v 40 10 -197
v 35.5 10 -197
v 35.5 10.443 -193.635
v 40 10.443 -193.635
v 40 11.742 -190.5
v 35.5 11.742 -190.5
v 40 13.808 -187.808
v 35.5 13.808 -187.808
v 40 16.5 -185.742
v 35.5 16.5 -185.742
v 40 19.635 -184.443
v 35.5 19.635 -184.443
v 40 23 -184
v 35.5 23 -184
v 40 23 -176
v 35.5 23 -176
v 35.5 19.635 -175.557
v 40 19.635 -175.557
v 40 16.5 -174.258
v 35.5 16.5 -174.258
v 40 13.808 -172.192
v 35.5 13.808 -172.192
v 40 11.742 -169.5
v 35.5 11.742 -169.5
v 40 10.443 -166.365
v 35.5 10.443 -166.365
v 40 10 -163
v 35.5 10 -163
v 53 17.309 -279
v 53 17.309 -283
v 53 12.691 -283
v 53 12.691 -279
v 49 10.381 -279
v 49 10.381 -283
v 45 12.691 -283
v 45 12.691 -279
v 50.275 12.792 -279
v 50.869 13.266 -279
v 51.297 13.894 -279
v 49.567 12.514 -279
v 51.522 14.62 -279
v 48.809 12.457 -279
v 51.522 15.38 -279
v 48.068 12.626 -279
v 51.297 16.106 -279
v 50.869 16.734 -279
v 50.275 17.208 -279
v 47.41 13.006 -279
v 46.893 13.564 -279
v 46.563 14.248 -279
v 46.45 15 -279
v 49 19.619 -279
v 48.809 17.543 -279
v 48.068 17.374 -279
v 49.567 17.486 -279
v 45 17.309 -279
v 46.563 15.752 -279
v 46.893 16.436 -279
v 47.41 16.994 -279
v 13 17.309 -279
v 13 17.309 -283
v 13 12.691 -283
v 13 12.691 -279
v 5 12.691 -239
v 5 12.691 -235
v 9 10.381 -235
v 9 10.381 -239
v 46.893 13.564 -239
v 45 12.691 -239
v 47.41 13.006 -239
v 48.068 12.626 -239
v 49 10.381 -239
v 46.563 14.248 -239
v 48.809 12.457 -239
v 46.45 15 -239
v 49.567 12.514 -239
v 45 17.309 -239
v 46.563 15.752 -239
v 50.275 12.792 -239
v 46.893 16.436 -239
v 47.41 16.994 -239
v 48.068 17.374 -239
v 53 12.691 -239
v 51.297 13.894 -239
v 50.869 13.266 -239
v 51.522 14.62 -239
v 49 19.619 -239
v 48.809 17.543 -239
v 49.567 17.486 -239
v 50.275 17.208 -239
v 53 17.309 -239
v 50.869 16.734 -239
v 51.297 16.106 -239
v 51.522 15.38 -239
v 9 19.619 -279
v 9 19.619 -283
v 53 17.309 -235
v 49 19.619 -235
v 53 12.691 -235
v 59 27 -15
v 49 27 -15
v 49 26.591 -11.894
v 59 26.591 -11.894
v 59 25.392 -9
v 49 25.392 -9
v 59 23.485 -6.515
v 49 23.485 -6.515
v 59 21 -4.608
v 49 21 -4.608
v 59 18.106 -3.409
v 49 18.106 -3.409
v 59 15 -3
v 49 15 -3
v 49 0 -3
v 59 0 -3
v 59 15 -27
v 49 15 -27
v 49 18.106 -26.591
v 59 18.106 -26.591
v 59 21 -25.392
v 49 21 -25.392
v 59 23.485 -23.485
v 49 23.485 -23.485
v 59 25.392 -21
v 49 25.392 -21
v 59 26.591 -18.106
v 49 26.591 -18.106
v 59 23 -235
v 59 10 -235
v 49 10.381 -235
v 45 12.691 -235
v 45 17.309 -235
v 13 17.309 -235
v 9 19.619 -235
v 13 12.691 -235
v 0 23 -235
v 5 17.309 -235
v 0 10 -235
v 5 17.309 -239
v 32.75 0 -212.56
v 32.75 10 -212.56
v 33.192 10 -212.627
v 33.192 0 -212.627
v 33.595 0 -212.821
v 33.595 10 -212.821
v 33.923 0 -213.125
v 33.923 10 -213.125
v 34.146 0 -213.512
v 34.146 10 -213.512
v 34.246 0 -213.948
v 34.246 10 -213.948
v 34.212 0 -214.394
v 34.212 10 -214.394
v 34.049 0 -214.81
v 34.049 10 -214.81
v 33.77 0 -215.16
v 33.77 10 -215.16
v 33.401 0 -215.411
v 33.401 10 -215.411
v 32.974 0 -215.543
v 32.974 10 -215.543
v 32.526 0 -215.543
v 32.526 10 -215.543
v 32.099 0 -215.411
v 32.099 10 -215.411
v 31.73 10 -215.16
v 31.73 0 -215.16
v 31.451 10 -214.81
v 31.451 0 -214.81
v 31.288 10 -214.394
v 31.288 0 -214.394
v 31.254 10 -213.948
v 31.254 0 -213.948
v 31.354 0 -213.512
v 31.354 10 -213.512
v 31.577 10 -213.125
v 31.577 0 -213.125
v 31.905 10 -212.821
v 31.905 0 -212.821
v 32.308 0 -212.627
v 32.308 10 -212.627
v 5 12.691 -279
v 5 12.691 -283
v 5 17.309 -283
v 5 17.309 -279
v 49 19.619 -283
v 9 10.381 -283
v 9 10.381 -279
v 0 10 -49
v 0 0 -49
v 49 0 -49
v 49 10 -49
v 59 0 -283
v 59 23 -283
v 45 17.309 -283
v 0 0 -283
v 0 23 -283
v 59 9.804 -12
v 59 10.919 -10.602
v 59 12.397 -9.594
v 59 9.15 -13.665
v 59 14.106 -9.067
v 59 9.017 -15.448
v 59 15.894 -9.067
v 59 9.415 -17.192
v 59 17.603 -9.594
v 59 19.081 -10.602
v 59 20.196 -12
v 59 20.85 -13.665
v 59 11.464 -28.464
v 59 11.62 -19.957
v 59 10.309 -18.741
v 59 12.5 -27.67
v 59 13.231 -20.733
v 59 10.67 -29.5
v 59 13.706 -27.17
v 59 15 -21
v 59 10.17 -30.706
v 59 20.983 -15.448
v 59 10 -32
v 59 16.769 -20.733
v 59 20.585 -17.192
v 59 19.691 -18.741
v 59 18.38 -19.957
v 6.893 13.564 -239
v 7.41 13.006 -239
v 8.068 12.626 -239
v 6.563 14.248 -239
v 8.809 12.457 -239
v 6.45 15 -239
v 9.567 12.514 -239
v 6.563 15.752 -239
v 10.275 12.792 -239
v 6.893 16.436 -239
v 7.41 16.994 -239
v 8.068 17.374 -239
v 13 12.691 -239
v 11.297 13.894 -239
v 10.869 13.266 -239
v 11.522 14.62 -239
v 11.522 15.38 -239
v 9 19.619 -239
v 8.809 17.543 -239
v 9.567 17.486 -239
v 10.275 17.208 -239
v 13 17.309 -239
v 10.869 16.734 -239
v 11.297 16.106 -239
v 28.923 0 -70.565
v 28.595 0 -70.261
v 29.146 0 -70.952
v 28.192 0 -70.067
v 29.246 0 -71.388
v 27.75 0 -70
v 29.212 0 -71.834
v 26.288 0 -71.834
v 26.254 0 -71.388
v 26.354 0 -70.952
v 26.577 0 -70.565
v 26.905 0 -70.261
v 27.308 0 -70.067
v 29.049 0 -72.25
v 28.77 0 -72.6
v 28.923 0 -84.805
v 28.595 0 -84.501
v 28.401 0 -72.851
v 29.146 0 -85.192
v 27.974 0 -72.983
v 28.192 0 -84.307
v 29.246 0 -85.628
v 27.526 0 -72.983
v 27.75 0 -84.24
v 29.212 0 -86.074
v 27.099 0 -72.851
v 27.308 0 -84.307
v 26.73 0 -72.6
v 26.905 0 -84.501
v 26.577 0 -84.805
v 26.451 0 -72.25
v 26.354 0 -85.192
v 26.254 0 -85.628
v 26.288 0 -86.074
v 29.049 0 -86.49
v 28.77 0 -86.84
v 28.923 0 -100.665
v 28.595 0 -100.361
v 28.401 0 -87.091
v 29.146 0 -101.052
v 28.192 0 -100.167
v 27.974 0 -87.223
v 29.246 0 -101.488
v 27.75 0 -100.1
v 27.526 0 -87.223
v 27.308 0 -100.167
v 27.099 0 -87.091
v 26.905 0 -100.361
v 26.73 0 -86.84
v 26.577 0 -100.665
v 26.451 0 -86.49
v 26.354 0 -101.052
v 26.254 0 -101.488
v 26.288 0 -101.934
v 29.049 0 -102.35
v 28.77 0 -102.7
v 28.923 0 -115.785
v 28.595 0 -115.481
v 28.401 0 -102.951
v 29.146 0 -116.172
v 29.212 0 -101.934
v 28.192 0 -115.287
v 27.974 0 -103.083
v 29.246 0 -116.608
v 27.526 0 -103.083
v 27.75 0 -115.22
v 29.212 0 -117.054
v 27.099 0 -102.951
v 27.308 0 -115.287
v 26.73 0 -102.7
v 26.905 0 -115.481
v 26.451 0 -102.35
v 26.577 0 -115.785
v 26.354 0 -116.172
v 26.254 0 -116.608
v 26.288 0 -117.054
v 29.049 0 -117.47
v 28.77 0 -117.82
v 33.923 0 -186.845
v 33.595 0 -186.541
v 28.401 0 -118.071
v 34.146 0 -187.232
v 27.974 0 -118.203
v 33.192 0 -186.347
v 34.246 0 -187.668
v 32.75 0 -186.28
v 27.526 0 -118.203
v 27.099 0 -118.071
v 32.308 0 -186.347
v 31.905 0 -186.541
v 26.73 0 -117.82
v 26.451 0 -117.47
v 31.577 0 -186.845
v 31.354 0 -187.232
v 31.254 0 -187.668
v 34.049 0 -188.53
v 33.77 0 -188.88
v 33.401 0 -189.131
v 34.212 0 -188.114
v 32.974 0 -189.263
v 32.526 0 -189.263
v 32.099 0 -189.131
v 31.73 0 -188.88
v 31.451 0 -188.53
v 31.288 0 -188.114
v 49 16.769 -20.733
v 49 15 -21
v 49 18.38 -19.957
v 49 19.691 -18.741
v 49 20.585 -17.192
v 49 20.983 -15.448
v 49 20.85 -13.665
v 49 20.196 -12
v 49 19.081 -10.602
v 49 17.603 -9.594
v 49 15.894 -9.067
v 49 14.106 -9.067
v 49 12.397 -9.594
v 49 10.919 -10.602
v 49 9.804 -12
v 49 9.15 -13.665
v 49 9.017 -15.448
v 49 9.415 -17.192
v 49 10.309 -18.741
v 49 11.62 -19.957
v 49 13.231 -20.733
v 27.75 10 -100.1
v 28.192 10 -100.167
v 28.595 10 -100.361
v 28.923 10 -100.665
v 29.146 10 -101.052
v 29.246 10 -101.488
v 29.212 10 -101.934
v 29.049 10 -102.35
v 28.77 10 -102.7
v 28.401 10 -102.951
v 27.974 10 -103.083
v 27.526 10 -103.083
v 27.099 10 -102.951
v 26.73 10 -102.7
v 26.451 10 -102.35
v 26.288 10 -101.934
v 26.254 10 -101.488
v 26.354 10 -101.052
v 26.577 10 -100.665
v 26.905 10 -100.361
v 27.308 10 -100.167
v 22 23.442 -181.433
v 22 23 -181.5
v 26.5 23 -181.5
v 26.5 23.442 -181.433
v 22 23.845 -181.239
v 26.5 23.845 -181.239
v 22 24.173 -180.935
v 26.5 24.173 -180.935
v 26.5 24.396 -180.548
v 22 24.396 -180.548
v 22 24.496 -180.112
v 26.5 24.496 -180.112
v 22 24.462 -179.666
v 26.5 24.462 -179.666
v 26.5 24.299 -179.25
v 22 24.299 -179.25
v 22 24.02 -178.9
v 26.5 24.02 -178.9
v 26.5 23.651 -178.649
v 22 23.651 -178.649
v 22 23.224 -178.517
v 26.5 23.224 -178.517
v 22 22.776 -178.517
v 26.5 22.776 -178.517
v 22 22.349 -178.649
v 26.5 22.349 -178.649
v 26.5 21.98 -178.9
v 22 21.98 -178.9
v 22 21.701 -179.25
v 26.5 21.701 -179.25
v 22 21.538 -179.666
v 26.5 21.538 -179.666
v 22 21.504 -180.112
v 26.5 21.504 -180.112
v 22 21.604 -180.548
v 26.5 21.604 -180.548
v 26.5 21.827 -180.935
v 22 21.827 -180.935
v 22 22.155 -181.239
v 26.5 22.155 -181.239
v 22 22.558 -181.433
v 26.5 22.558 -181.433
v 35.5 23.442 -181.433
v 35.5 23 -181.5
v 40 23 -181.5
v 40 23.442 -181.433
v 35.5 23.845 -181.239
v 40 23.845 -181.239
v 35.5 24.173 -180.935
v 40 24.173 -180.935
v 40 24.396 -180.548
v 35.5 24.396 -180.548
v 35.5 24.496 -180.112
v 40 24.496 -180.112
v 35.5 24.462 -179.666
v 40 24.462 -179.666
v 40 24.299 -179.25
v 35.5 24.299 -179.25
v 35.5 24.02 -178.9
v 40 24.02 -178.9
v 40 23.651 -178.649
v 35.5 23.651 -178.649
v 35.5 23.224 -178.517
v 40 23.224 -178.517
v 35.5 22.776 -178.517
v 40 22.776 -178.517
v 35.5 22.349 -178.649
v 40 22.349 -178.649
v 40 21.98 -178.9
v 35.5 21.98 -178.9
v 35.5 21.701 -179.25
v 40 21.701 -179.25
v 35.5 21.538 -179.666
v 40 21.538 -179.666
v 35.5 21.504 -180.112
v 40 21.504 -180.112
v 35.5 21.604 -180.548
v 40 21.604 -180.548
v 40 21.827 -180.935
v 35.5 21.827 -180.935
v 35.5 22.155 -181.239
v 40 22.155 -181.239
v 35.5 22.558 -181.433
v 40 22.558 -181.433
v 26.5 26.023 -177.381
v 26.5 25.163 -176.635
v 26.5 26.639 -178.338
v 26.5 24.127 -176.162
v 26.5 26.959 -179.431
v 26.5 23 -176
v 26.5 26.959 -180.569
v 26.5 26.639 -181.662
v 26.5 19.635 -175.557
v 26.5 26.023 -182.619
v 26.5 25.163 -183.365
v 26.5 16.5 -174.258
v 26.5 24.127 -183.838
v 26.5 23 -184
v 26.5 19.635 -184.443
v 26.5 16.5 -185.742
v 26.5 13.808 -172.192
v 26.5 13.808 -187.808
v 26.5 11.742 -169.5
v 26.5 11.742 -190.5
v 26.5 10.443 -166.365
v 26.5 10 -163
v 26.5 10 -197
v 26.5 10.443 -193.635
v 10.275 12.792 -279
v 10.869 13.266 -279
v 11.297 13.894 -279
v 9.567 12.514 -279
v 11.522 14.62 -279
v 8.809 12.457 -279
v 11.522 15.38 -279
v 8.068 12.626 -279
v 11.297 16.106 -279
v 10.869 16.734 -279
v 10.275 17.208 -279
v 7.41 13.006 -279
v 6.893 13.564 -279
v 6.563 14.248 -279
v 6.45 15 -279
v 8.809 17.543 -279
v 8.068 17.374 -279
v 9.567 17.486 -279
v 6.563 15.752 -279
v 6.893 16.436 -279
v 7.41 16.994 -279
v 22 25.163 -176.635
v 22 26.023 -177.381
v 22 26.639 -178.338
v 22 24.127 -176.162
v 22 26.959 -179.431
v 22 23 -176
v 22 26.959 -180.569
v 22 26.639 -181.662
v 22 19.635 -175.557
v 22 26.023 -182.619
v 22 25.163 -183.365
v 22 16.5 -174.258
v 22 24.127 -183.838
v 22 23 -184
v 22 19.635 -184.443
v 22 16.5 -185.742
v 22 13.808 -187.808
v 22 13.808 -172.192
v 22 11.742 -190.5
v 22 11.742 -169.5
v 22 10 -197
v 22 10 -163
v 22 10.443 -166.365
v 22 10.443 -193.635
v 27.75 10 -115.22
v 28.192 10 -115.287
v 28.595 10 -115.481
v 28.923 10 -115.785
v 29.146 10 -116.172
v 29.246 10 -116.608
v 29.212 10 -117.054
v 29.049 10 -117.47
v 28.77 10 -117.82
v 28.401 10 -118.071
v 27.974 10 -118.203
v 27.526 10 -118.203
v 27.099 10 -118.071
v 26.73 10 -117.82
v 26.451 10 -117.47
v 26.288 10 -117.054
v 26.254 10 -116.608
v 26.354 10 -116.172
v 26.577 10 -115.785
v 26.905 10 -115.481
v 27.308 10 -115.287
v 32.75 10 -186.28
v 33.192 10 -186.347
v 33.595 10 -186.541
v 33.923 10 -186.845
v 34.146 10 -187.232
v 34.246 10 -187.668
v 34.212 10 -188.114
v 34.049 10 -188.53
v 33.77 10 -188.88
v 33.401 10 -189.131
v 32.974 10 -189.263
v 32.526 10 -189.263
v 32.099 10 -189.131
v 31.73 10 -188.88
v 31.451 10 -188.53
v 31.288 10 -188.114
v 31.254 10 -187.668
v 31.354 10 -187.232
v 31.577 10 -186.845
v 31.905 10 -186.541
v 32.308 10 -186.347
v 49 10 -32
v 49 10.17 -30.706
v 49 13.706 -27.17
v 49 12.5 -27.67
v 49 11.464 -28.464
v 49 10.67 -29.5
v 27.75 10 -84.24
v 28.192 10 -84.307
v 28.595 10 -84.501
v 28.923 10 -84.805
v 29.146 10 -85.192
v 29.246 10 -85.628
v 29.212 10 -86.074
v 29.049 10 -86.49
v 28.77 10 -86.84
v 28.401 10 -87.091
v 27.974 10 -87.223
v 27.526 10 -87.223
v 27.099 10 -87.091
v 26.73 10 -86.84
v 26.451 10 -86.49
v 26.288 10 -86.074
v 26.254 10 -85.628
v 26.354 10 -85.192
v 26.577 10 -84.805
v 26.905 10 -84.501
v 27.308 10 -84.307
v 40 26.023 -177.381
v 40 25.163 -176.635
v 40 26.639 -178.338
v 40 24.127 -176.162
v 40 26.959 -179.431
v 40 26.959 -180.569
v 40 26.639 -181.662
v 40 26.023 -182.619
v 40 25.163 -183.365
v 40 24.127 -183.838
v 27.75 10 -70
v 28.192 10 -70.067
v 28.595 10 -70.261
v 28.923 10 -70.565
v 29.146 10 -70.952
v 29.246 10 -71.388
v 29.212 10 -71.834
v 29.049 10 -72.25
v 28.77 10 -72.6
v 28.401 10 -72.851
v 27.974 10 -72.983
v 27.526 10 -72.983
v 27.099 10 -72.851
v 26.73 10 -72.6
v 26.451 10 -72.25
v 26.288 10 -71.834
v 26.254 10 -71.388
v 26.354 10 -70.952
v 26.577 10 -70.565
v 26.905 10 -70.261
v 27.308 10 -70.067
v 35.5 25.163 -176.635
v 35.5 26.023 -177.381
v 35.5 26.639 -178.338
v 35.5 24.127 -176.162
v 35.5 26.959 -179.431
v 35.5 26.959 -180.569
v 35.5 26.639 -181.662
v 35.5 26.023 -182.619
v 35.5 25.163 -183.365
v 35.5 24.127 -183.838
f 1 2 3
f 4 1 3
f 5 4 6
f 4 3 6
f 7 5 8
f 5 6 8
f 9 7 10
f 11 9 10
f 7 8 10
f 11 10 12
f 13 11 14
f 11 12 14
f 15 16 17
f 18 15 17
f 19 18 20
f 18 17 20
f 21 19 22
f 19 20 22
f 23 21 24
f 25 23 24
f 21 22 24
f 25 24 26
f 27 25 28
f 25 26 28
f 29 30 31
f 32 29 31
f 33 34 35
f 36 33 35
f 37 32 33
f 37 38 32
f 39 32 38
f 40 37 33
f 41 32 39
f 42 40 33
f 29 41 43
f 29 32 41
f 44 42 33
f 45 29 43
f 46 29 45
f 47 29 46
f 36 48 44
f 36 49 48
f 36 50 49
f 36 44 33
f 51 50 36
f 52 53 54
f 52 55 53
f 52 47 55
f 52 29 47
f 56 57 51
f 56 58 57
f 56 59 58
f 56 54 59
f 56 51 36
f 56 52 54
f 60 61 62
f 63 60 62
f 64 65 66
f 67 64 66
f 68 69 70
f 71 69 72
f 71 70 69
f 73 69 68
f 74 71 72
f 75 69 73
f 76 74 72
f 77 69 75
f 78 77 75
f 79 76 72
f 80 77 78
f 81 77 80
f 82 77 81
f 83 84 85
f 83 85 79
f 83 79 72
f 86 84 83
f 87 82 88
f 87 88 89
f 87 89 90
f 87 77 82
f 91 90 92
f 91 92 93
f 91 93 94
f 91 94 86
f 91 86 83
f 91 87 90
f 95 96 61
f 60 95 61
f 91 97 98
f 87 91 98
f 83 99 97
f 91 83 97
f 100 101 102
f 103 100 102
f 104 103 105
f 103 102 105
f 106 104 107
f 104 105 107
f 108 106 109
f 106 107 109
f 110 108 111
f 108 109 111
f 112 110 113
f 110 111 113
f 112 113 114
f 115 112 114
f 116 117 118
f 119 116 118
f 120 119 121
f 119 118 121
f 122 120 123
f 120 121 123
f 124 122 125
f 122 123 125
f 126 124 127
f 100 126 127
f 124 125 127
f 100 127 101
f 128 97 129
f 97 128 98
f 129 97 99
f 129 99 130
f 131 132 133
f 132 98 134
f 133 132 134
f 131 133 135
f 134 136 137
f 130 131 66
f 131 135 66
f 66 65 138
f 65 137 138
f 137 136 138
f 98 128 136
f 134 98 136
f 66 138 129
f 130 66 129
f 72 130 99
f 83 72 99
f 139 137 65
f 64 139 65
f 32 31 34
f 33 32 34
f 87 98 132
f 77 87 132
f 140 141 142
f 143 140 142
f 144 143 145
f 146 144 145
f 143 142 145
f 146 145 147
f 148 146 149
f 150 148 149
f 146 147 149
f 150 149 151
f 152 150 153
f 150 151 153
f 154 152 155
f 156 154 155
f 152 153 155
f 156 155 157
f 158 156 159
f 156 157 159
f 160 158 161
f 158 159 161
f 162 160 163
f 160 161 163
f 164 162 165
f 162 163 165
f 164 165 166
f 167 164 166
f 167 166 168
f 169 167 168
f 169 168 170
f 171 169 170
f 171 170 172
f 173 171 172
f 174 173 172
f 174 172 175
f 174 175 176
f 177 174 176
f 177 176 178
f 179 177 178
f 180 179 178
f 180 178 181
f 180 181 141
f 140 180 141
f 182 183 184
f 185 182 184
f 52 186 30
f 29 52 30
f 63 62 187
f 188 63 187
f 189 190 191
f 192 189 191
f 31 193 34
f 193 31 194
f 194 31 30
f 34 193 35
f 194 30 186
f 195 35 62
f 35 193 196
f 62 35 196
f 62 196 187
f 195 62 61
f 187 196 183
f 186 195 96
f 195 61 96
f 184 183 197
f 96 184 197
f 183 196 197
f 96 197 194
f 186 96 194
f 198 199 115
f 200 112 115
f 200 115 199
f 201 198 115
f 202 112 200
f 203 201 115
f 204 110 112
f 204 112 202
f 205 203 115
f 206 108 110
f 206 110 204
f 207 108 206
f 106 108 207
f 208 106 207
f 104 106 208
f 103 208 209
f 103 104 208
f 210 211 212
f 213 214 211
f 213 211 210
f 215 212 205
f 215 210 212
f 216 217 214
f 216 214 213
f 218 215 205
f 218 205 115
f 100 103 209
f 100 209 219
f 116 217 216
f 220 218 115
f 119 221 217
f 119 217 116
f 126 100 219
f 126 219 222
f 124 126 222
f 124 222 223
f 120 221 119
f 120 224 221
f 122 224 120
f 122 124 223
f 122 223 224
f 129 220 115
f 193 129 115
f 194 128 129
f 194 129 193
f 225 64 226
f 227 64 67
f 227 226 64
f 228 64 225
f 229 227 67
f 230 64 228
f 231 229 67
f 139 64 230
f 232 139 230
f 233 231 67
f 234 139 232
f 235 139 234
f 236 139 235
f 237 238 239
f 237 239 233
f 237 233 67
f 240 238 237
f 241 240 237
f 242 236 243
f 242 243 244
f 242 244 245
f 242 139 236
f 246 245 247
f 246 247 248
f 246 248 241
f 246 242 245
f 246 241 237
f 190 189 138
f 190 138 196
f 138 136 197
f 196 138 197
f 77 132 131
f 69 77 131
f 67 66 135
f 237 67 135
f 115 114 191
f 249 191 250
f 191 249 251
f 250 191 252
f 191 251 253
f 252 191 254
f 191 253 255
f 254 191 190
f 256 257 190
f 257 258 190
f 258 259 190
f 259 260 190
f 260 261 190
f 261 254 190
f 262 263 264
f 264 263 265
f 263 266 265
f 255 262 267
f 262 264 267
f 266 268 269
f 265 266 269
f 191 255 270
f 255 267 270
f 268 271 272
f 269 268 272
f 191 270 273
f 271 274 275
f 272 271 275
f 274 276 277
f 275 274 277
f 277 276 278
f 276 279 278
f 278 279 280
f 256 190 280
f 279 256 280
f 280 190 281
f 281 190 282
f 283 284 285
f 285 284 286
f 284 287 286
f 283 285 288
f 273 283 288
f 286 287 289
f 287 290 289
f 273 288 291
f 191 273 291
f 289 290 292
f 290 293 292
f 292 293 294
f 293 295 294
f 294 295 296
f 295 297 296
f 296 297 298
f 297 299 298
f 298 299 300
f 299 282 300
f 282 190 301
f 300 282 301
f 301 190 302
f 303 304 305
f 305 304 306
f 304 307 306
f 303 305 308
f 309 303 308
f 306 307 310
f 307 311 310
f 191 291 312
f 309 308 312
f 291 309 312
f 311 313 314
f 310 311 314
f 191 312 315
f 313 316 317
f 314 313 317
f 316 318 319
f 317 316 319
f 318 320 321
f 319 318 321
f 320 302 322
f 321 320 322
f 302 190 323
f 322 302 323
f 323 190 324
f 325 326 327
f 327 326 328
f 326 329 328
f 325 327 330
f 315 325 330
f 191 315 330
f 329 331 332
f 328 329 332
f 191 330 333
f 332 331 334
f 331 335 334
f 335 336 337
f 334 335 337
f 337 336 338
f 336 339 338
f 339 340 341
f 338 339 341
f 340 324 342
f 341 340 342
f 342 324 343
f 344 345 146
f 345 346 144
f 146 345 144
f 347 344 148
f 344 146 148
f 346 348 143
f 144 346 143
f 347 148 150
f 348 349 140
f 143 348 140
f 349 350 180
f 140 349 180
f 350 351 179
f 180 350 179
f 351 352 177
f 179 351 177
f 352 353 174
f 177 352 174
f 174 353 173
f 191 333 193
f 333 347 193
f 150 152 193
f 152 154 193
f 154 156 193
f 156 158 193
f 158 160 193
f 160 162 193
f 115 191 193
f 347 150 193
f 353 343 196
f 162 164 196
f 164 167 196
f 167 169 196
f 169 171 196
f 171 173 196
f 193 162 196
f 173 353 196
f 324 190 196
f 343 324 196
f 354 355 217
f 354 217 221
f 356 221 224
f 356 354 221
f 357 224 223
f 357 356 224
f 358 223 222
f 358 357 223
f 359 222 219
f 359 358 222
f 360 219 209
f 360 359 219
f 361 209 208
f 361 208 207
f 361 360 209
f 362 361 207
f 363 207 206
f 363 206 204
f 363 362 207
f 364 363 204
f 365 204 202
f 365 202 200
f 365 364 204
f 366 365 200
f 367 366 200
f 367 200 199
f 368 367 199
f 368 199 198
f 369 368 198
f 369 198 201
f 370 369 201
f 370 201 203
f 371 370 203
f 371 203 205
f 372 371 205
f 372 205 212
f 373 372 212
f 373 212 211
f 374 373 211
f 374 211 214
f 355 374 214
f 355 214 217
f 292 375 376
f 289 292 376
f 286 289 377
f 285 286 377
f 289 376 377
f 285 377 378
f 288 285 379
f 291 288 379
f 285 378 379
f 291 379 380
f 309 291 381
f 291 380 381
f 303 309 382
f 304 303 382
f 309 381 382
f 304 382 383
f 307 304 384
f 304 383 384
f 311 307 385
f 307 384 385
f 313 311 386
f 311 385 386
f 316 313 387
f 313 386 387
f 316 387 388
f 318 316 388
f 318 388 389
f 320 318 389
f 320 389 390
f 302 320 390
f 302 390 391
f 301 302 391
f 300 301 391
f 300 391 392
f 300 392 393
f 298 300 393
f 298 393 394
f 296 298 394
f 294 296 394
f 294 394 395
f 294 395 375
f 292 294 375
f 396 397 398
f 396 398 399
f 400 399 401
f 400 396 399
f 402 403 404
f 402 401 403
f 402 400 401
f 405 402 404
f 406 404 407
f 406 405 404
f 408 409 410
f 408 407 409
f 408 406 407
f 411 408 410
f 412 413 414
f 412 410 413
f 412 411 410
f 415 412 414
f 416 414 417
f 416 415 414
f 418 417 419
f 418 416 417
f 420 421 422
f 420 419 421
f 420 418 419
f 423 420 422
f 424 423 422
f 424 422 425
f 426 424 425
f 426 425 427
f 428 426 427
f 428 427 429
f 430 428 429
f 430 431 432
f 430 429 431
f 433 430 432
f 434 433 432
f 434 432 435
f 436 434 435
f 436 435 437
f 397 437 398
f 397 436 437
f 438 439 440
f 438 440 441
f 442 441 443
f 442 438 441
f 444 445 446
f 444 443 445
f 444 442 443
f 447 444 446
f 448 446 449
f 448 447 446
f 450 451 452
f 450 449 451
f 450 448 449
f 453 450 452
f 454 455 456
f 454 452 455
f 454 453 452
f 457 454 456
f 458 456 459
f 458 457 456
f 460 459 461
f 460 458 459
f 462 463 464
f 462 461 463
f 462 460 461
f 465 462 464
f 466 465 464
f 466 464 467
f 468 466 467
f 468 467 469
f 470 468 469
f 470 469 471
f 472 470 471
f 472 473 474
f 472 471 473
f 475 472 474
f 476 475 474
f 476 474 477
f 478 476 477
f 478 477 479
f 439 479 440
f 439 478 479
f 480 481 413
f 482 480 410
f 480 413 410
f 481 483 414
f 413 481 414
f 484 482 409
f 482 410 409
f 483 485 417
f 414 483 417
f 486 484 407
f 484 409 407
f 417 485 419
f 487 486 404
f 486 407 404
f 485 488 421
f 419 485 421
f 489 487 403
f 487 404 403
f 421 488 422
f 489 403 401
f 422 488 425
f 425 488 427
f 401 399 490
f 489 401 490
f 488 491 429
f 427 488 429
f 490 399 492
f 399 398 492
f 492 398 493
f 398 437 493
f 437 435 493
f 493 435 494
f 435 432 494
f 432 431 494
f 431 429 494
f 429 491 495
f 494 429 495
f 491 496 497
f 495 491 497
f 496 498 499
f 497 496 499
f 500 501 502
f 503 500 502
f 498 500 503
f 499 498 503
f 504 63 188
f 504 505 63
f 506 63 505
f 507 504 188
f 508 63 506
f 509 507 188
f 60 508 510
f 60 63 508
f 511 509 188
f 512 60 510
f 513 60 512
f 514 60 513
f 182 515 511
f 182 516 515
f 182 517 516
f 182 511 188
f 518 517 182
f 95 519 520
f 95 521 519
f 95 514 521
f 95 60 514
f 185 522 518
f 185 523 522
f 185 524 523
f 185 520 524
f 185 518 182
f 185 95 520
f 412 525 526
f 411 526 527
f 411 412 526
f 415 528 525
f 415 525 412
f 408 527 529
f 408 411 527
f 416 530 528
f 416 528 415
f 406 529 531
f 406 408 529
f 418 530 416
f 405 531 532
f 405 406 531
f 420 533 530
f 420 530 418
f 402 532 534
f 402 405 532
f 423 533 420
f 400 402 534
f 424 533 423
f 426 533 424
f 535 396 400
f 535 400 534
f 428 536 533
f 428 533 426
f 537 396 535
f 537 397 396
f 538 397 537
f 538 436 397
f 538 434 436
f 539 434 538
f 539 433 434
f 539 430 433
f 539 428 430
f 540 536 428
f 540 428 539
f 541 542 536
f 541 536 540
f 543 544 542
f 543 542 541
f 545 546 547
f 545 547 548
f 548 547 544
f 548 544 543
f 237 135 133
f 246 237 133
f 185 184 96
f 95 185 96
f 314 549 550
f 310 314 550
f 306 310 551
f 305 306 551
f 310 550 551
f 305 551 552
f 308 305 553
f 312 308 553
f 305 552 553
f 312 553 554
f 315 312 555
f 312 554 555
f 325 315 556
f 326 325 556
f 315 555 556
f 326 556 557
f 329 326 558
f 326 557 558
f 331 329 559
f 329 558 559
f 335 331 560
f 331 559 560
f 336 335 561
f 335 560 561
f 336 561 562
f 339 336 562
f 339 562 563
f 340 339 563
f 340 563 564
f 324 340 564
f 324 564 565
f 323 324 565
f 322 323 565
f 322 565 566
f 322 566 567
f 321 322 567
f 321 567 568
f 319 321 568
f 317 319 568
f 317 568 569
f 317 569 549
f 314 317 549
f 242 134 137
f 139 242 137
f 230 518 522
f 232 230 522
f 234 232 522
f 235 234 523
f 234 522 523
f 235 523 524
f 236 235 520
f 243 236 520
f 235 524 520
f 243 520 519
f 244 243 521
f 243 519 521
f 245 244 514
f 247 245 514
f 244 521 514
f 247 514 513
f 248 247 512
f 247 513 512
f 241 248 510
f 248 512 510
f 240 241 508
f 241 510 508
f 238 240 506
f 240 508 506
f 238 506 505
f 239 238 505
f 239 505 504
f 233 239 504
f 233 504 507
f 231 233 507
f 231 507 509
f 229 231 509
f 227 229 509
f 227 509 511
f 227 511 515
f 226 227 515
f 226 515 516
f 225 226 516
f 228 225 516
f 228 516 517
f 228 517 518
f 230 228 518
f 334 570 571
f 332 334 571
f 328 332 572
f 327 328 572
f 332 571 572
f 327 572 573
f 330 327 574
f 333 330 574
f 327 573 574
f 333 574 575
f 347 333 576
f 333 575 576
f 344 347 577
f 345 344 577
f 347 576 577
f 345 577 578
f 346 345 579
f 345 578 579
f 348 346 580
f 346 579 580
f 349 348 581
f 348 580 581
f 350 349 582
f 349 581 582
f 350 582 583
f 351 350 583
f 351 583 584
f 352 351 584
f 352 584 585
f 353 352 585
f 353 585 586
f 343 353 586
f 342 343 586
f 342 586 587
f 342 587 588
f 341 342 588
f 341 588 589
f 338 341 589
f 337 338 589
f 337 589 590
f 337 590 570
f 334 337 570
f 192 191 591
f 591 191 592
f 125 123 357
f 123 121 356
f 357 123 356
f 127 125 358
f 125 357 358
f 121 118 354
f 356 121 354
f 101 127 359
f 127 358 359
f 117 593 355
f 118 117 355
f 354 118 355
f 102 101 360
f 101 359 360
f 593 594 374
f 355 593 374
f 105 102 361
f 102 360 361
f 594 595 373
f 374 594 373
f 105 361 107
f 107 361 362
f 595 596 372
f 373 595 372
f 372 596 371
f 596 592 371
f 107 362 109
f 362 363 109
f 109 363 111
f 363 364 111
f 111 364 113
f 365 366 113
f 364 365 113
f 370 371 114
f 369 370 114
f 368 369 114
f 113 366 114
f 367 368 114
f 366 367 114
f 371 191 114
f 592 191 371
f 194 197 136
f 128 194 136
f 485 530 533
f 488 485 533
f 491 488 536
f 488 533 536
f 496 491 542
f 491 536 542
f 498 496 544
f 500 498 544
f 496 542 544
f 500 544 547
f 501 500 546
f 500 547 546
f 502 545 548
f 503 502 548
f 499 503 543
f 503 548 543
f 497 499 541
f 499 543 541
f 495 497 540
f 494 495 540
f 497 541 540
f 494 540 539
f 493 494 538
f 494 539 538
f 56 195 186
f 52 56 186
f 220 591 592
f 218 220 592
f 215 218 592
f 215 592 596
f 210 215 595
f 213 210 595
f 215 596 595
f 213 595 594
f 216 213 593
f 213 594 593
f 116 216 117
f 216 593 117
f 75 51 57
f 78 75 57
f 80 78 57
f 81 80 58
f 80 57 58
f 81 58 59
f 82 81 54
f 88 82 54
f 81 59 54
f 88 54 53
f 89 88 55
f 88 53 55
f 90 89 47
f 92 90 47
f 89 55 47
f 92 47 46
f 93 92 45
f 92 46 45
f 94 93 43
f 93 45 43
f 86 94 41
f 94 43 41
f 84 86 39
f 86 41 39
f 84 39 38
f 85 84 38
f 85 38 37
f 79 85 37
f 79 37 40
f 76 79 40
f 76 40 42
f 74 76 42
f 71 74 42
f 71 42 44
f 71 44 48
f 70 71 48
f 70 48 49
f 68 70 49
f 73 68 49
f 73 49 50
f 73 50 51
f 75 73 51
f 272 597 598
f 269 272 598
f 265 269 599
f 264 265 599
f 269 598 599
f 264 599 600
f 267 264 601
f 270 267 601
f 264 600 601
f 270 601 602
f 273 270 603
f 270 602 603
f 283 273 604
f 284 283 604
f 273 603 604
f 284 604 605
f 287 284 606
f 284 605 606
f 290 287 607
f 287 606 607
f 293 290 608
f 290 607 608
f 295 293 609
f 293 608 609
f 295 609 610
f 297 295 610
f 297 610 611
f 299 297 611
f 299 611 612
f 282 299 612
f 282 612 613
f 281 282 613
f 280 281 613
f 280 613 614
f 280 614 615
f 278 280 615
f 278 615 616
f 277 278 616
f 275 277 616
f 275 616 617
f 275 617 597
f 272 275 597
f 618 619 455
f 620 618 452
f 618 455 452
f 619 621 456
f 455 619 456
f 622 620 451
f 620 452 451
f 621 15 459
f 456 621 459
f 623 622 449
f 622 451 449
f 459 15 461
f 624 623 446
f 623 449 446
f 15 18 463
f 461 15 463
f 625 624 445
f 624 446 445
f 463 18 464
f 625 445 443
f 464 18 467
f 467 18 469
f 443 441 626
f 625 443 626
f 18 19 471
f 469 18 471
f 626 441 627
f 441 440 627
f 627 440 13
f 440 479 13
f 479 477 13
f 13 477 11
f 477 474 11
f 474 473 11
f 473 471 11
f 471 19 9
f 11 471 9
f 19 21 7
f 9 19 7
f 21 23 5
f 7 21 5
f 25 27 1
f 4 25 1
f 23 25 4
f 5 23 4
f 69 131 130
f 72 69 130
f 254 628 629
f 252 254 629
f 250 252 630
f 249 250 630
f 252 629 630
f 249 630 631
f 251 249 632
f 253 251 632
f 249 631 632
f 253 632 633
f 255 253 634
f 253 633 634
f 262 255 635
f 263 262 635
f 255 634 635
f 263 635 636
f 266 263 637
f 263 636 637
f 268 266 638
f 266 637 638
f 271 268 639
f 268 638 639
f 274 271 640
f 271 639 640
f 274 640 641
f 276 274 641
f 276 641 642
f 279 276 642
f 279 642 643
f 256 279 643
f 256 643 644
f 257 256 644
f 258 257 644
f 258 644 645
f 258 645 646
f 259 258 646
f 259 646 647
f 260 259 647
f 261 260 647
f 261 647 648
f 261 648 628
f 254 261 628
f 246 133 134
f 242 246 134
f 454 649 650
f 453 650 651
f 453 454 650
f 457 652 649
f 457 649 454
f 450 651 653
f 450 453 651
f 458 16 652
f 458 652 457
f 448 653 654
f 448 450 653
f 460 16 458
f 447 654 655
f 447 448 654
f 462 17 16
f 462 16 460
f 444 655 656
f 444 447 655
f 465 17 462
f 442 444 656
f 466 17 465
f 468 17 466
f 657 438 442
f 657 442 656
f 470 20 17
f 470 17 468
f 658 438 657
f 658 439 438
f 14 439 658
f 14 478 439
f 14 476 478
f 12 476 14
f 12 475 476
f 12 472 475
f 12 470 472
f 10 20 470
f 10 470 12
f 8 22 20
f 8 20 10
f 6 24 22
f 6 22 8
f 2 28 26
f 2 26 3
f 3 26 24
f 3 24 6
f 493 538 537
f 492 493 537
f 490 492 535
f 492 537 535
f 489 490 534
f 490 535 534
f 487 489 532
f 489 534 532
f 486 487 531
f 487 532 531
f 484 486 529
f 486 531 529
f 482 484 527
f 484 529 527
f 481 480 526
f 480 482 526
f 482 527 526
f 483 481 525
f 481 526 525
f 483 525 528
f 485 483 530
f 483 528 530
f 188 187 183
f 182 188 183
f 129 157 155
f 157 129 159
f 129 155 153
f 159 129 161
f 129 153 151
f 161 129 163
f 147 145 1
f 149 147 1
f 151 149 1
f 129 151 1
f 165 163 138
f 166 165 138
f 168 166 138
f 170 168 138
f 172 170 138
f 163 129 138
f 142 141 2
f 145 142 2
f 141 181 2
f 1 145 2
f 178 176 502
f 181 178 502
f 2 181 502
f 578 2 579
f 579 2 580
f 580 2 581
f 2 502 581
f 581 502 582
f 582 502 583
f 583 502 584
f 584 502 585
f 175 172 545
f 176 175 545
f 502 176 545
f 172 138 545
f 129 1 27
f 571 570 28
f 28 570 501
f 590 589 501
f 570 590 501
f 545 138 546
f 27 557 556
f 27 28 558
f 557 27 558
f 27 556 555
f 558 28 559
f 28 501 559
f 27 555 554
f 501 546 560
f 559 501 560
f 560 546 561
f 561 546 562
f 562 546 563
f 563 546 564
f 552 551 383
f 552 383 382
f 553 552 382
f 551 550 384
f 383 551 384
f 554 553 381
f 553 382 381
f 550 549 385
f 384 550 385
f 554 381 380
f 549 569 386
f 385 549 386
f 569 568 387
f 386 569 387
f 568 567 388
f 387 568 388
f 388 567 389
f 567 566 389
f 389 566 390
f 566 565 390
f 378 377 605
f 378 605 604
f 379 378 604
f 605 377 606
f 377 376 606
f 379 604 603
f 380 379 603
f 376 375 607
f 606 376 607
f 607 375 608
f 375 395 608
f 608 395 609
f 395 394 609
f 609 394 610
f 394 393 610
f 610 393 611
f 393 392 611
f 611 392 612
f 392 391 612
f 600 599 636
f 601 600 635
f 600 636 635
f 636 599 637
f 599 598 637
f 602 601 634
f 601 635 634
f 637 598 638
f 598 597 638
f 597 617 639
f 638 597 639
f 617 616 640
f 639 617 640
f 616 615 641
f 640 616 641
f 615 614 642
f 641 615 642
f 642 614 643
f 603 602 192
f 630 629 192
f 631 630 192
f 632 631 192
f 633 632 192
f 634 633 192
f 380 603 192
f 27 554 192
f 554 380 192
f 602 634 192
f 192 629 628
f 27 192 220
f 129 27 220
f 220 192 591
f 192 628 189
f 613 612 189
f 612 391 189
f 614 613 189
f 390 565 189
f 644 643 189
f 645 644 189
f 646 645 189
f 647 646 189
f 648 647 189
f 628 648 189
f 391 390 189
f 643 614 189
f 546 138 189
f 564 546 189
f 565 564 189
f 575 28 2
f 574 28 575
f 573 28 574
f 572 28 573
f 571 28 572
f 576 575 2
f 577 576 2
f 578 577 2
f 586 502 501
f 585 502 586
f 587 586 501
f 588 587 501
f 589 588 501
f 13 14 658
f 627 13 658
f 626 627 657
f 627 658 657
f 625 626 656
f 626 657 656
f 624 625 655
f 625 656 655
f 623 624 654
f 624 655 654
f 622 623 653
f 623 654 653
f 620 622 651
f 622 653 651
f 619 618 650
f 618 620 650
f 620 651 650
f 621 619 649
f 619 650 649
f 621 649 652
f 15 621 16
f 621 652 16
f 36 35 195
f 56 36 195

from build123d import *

# Parameters (mm, degrees)
SKETCH1_R           = 6
SKETCH1_R_2         = 1.5
BOSS_EXTRUDE1_DEPTH = 59
SKETCH2_W           = 49
SKETCH2_H           = 46
CUT_EXTRUDE1_DEPTH  = 291.342900723
SKETCH3_W           = 9
SKETCH3_H           = 50
SKETCH3_W_2         = 22
SKETCH3_W_3         = 19
CUT_EXTRUDE2_DEPTH  = 290.584184651
CUT_EXTRUDE3_DEPTH  = 4
SKETCH7_R           = 2.55
CUT_EXTRUDE4_DEPTH  = 82
CUT_EXTRUDE5_DEPTH  = 4
SKETCH9_R           = 1.5
CUT_EXTRUDE6_DEPTH  = 290.584184651


with BuildPart() as part:
    # Sketch1 → Boss-Extrude1 (new body)
    with BuildSketch(Plane(origin=(0, 0, 0), x_dir=(0, 0, -1), z_dir=(1, 0, 0))):
        with BuildLine():
            Line((3, 15), (3, 0))
            Line((3, 0), (283, 0))
            Line((283, 0), (283, 23))
            Line((283, 23), (235, 23))
            Line((235, 23), (235, 10))
            Line((235, 10), (197, 10))
            ThreePointArc((197, 10), (187.807611845, 13.807611845), (184, 23))
            ThreePointArc((184, 23), (180, 27), (176, 23))
            ThreePointArc((176, 23), (172.192388155, 13.807611845), (163, 10))
            Line((163, 10), (32, 10))
            ThreePointArc((32, 10), (28.464466094, 11.464466094), (27, 15))
            ThreePointArc((27, 15), (23.485281374, 23.485281374), (15, 27))
            ThreePointArc((15, 27), (6.514718626, 23.485281374), (3, 15))
        make_face()
        with Locations((15, 15)):
            Circle(SKETCH1_R, mode=Mode.SUBTRACT)
        with Locations((180, 23)):
            Circle(SKETCH1_R_2, mode=Mode.SUBTRACT)
    extrude(amount=BOSS_EXTRUDE1_DEPTH)

    # Sketch2 → Cut-Extrude1 (cut, through all)
    with BuildSketch(Plane.XZ):
        with Locations((24.5, -26)):
            Rectangle(SKETCH2_W, SKETCH2_H)
    extrude(amount=-CUT_EXTRUDE1_DEPTH, mode=Mode.SUBTRACT)

    # Sketch3 → Cut-Extrude2 (cut, through all)
    with BuildSketch(Plane(origin=(0, 10, 0), x_dir=(1, 0, 0), z_dir=(0, 1, 0))):
        with Locations((31, 172)):
            Rectangle(SKETCH3_W, SKETCH3_H)
        with Locations((11, 172)):
            Rectangle(SKETCH3_W_2, SKETCH3_H)
        with Locations((49.5, 172)):
            Rectangle(SKETCH3_W_3, SKETCH3_H)
    extrude(amount=CUT_EXTRUDE2_DEPTH, mode=Mode.SUBTRACT)

    # Sketch6 → Cut-Extrude3 (cut)
    with BuildSketch(Plane(origin=(0, 0, -283), x_dir=(-1, 0, 0), z_dir=(0, 0, -1))):
        Polygon((-49, 10.381197846), (-45, 12.690598923), (-45, 17.309401077), (-49, 19.618802154), (-53, 17.309401077), (-53, 12.690598923), align=None)
        Polygon((-9, 10.381197846), (-5, 12.690598923), (-5, 17.309401077), (-9, 19.618802154), (-13, 17.309401077), (-13, 12.690598923), align=None)
    extrude(amount=-CUT_EXTRUDE3_DEPTH, mode=Mode.SUBTRACT)

    # Sketch7 → Cut-Extrude4 (cut)
    with BuildSketch(Plane(origin=(0, 0, -279), x_dir=(-1, 0, 0), z_dir=(0, 0, -1))):
        with Locations((-49, 15)):
            Circle(SKETCH7_R)
        with Locations((-9, 15)):
            Circle(SKETCH7_R)
    extrude(amount=-CUT_EXTRUDE4_DEPTH, mode=Mode.SUBTRACT)

    # Sketch8 → Cut-Extrude5 (cut)
    with BuildSketch(Plane.XY.offset(-235)):
        Polygon((9, 10.381197846), (13, 12.690598923), (13, 17.309401077), (9, 19.618802154), (5, 17.309401077), (5, 12.690598923), align=None)
        Polygon((49, 10.381197846), (53, 12.690598923), (53, 17.309401077), (49, 19.618802154), (45, 17.309401077), (45, 12.690598923), align=None)
    extrude(amount=-CUT_EXTRUDE5_DEPTH, mode=Mode.SUBTRACT)

    # Sketch9 → Cut-Extrude6 (cut, through all)
    with BuildSketch(Plane(origin=(0, 10, 0), x_dir=(1, 0, 0), z_dir=(0, 1, 0))):
        with Locations(Location((27.75, 71.5, 0), (0, 0, 270))):
            Circle(SKETCH9_R)
        with Locations(Location((27.75, 85.74, 0), (0, 0, 270))):
            Circle(SKETCH9_R)
        with Locations(Location((27.75, 101.6, 0), (0, 0, 270))):
            Circle(SKETCH9_R)
        with Locations(Location((27.75, 116.72, 0), (0, 0, 270))):
            Circle(SKETCH9_R)
        with Locations(Location((32.75, 187.78, 0), (0, 0, 270))):
            Circle(SKETCH9_R)
        with Locations(Location((32.75, 214.06, 0), (0, 0, 270))):
            Circle(SKETCH9_R)
    extrude(amount=-CUT_EXTRUDE6_DEPTH, mode=Mode.SUBTRACT)


solid = part.part
